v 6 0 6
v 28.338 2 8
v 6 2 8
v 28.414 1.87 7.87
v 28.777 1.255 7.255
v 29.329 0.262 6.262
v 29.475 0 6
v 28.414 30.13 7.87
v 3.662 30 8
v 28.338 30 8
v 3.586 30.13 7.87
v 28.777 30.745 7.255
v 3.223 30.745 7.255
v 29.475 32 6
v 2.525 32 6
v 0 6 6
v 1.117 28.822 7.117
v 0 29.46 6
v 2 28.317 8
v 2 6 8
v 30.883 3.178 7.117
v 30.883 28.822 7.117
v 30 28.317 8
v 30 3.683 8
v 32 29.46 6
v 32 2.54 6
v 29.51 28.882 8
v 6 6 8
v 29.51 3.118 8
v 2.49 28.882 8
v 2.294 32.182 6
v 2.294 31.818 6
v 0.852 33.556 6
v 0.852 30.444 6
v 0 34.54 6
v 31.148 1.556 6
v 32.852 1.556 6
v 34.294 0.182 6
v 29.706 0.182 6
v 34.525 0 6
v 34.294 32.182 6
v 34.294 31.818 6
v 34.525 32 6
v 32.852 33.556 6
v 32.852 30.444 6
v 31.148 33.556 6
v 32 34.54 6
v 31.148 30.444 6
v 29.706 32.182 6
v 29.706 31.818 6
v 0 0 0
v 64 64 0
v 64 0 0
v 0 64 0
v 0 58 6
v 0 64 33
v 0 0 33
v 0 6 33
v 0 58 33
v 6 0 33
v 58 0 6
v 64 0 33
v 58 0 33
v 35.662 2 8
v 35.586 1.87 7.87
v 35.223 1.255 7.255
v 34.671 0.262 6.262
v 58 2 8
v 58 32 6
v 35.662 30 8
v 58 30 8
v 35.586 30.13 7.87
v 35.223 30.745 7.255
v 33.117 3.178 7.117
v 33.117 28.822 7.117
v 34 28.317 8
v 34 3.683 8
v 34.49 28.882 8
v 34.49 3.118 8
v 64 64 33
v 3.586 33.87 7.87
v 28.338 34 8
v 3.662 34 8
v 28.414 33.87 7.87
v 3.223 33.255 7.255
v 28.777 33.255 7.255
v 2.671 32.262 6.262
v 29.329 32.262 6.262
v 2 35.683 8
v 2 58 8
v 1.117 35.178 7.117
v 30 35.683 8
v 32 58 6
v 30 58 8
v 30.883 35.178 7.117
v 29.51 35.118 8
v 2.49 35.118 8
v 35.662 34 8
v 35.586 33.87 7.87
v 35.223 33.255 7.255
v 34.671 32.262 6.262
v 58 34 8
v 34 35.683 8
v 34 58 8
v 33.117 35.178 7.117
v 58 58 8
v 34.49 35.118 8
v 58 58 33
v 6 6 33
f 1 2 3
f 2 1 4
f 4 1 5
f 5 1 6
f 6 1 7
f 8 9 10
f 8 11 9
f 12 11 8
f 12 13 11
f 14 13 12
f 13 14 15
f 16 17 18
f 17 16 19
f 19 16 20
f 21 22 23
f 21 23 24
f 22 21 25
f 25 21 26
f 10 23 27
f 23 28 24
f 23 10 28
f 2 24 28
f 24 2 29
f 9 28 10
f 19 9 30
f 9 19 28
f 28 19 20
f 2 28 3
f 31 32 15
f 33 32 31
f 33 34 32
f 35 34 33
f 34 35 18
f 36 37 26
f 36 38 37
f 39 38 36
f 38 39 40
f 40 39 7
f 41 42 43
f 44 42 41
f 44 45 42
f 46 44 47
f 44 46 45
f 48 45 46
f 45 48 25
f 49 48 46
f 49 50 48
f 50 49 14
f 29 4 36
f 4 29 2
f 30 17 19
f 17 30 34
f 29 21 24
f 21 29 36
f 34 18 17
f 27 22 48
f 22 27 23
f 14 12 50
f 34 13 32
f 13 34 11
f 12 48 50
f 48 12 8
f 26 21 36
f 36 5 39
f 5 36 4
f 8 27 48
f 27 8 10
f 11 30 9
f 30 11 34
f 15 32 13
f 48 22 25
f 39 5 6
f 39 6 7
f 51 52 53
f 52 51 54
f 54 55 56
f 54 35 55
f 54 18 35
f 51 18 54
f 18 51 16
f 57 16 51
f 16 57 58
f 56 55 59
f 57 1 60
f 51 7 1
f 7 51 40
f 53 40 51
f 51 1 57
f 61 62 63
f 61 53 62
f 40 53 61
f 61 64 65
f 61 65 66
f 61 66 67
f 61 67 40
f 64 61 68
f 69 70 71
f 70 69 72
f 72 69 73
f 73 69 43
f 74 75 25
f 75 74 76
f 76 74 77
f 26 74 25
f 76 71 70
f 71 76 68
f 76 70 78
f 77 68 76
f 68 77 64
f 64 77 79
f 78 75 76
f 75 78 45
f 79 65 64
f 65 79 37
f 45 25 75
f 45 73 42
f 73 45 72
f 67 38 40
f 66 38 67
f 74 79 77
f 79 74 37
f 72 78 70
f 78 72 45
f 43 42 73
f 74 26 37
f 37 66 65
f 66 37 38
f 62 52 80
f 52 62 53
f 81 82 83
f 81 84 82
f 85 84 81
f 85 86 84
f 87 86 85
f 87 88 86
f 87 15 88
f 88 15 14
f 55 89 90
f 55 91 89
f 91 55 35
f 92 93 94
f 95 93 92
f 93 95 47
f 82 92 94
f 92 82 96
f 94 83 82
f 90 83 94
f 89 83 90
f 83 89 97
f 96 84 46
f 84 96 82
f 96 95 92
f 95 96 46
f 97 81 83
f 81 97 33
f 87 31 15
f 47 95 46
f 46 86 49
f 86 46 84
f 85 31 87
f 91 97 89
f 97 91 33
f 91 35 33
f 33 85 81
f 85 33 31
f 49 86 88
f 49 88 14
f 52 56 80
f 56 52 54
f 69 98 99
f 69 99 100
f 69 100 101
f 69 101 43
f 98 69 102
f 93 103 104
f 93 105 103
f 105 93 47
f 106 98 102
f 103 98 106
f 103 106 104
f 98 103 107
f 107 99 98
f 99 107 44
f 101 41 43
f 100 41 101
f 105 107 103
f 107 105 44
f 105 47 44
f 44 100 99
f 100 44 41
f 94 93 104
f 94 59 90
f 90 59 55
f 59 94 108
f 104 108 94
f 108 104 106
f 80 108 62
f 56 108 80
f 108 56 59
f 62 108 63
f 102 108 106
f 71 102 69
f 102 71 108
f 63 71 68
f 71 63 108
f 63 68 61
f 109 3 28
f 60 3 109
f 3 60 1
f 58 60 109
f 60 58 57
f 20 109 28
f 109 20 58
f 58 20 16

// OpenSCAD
// file: WylochStyleDungeonLibrary.scad
//Constants
wallleft = 0;
wallbottom = 1;
wallright = 2;
walltop = 3;
wallcenter = 4;
walldoubleright = 5;


//Variables
size = 32;
baseheight = 6;
topperheight = 2;
topperrounded = true;
walllength = size;
wallheight = 25 + baseheight + topperheight;
wallwidth = 6;
wallwidththin = 4;


//Functions
function hypotenuse_ra(side_a, side_b) =
    sqrt(pow(side_a, 2) + pow(side_b, 2));
    
    
//Modules    
module wsdl_Base(s,bh)
{
    cube([s,s,bh]);
}

module wsdl_Topper(s,bh,th,tr)
{
    if (tr) {
        translate([0,0,bh])
            intersection() {
                difference () {
                        cube([s,s,th]);
                        union () {
                        rotate(a=45, v=[1,0,0])
                            cube([s,th*2,th*2]);
                        translate([0,s,0])
                            rotate(a=45, v=[1,0,0])
                                cube([s,th*2,th*2]);
                        rotate(a=-45, v=[0,1,0])
                            cube([th*2,s,th*2]);
                        translate([s,0,0])
                            rotate(a=-45, v=[0,1,0])
                                cube([th*2,s,th*2]);
                        }
                }
                translate([s/2,s/2,0])
                    cylinder(
                        h=th, 
                        r1=hypotenuse_ra(s/2-1.2, s/2-1.2), 
                        r2=hypotenuse_ra(s/2-th-.8, s/2-th-.8), 
                        center=false, 
                        $fa=.1);
            }    
    }
    else {
        translate([0,0,bh])
            difference() {
                cube([s,s,th]);
                union () {
                rotate(a=45, v=[1,0,0])
                    cube([s,th*2,th*2]);
                translate([0,s,0])
                    rotate(a=45, v=[1,0,0])
                        cube([s,th*2,th*2]);
                rotate(a=-45, v=[0,1,0])
                    cube([th*2,s,th*2]);
                translate([s,0,0])
                    rotate(a=-45, v=[0,1,0])
                        cube([th*2,s,th*2]);
                }
            }    
    }
}

module wsdl_Base_1x1(s,bh,th,tr) 
{
    union () {
        wsdl_Base(s,bh);
        wsdl_Topper(s,bh,th,tr);
    }
}

module wsdl_Base_1x2(s,bh,th,tr)
{
    union () {
        wsdl_Base_1x1(s,bh,th,tr);
        translate([s,0,0])
            wsdl_Base_1x1(s,bh,th,tr);
    }
}
 
module wsdl_Base_2x2(s,bh,th,tr)
{
    union () {
        wsdl_Base_1x2(s,bh,th,tr);
        translate([0,s,0])
            wsdl_Base_1x2(s,bh,th,tr);
    }
}
 
module wsdl_Base_2x4(s,bh,th,tr)
{
    union () {
        wsdl_Base_2x2(s,bh,th,tr);
        translate([s*2,0,0])
            wsdl_Base_2x2(s,bh,th,tr);
    }
}
 
module wsdl_Base_4x4(s,bh,th,tr)
{
    union () {
        wsdl_Base_2x4(s,bh,th,tr);
        translate([0,s*2,0])
            wsdl_Base_2x4(s,bh,th,tr);
    }
}
 
module wsdl_Wall_1(w,l,h)
{
    cube([w,l,h]);   
}

module wsdl_Wall_1_Position(w,l,h,p)
{
    if (p==0) {
        wsdl_Wall_1(w,l,h);
    }
    
    else if (p==1) {
        rotate(a=-90)
           translate([-w,0,0])
               wsdl_Wall_1(w,l,h);       
    }
    
    else if (p==2) {
        translate([(size)-w,0,0])
            wsdl_Wall_1(w,l,h);
    }
    
    else if (p==3) {
        rotate(a=-90)
            translate([-l,0,0])
                wsdl_Wall_1(w,l,h);
    }
    
    else if (p==4) {
        translate([(size)-w/2,0,0])
            wsdl_Wall_1(w,l,h);
    }
    
    else if (p==5) {
        translate([(size*2)-w,0,0])
           wsdl_Wall_1(w,l,h);       
    }
}

module wsdl_Wall_2(w,l,h)
{
    union() {
        wsdl_Wall_1(w,l,h);
        translate([0,l,0])
            wsdl_Wall_1(w,l,h);
    }
}

module wsdl_Wall_2_Position(w,l,h,p)
{
    if (p==0) {
        wsdl_Wall_2(w,l,h);
    }
    
    else if (p==1) {
        rotate(a=-90)
            translate([-w,0,0])
                wsdl_Wall_2(w,l,h);
    }
    
    else if (p==2) {
    translate([(size*2)-w,0,0])
        wsdl_Wall_2(w,l,h);
    }
    
    else if (p==3) {
        rotate(a=-90)
            translate([-l*2,0,0])
                wsdl_Wall_2(w,l,h);
    }
    
    else if (p==4) {
        translate([(size)-w/2,0,0])
            wsdl_Wall_2(w,l,h);
    }
}
// main file
include <WylochStyleDungeonLibrary.scad>; 

wsdl_Base_2x2(size,baseheight,topperheight,topperrounded);
wsdl_Wall_2_Position(wallwidth,walllength,wallheight,walltop);
wsdl_Wall_2_Position(wallwidth,walllength,wallheight,wallright);
//Create Pillar with Modified wall
wsdl_Wall_1_Position(wallwidth,wallwidth,wallheight,wallleft);
